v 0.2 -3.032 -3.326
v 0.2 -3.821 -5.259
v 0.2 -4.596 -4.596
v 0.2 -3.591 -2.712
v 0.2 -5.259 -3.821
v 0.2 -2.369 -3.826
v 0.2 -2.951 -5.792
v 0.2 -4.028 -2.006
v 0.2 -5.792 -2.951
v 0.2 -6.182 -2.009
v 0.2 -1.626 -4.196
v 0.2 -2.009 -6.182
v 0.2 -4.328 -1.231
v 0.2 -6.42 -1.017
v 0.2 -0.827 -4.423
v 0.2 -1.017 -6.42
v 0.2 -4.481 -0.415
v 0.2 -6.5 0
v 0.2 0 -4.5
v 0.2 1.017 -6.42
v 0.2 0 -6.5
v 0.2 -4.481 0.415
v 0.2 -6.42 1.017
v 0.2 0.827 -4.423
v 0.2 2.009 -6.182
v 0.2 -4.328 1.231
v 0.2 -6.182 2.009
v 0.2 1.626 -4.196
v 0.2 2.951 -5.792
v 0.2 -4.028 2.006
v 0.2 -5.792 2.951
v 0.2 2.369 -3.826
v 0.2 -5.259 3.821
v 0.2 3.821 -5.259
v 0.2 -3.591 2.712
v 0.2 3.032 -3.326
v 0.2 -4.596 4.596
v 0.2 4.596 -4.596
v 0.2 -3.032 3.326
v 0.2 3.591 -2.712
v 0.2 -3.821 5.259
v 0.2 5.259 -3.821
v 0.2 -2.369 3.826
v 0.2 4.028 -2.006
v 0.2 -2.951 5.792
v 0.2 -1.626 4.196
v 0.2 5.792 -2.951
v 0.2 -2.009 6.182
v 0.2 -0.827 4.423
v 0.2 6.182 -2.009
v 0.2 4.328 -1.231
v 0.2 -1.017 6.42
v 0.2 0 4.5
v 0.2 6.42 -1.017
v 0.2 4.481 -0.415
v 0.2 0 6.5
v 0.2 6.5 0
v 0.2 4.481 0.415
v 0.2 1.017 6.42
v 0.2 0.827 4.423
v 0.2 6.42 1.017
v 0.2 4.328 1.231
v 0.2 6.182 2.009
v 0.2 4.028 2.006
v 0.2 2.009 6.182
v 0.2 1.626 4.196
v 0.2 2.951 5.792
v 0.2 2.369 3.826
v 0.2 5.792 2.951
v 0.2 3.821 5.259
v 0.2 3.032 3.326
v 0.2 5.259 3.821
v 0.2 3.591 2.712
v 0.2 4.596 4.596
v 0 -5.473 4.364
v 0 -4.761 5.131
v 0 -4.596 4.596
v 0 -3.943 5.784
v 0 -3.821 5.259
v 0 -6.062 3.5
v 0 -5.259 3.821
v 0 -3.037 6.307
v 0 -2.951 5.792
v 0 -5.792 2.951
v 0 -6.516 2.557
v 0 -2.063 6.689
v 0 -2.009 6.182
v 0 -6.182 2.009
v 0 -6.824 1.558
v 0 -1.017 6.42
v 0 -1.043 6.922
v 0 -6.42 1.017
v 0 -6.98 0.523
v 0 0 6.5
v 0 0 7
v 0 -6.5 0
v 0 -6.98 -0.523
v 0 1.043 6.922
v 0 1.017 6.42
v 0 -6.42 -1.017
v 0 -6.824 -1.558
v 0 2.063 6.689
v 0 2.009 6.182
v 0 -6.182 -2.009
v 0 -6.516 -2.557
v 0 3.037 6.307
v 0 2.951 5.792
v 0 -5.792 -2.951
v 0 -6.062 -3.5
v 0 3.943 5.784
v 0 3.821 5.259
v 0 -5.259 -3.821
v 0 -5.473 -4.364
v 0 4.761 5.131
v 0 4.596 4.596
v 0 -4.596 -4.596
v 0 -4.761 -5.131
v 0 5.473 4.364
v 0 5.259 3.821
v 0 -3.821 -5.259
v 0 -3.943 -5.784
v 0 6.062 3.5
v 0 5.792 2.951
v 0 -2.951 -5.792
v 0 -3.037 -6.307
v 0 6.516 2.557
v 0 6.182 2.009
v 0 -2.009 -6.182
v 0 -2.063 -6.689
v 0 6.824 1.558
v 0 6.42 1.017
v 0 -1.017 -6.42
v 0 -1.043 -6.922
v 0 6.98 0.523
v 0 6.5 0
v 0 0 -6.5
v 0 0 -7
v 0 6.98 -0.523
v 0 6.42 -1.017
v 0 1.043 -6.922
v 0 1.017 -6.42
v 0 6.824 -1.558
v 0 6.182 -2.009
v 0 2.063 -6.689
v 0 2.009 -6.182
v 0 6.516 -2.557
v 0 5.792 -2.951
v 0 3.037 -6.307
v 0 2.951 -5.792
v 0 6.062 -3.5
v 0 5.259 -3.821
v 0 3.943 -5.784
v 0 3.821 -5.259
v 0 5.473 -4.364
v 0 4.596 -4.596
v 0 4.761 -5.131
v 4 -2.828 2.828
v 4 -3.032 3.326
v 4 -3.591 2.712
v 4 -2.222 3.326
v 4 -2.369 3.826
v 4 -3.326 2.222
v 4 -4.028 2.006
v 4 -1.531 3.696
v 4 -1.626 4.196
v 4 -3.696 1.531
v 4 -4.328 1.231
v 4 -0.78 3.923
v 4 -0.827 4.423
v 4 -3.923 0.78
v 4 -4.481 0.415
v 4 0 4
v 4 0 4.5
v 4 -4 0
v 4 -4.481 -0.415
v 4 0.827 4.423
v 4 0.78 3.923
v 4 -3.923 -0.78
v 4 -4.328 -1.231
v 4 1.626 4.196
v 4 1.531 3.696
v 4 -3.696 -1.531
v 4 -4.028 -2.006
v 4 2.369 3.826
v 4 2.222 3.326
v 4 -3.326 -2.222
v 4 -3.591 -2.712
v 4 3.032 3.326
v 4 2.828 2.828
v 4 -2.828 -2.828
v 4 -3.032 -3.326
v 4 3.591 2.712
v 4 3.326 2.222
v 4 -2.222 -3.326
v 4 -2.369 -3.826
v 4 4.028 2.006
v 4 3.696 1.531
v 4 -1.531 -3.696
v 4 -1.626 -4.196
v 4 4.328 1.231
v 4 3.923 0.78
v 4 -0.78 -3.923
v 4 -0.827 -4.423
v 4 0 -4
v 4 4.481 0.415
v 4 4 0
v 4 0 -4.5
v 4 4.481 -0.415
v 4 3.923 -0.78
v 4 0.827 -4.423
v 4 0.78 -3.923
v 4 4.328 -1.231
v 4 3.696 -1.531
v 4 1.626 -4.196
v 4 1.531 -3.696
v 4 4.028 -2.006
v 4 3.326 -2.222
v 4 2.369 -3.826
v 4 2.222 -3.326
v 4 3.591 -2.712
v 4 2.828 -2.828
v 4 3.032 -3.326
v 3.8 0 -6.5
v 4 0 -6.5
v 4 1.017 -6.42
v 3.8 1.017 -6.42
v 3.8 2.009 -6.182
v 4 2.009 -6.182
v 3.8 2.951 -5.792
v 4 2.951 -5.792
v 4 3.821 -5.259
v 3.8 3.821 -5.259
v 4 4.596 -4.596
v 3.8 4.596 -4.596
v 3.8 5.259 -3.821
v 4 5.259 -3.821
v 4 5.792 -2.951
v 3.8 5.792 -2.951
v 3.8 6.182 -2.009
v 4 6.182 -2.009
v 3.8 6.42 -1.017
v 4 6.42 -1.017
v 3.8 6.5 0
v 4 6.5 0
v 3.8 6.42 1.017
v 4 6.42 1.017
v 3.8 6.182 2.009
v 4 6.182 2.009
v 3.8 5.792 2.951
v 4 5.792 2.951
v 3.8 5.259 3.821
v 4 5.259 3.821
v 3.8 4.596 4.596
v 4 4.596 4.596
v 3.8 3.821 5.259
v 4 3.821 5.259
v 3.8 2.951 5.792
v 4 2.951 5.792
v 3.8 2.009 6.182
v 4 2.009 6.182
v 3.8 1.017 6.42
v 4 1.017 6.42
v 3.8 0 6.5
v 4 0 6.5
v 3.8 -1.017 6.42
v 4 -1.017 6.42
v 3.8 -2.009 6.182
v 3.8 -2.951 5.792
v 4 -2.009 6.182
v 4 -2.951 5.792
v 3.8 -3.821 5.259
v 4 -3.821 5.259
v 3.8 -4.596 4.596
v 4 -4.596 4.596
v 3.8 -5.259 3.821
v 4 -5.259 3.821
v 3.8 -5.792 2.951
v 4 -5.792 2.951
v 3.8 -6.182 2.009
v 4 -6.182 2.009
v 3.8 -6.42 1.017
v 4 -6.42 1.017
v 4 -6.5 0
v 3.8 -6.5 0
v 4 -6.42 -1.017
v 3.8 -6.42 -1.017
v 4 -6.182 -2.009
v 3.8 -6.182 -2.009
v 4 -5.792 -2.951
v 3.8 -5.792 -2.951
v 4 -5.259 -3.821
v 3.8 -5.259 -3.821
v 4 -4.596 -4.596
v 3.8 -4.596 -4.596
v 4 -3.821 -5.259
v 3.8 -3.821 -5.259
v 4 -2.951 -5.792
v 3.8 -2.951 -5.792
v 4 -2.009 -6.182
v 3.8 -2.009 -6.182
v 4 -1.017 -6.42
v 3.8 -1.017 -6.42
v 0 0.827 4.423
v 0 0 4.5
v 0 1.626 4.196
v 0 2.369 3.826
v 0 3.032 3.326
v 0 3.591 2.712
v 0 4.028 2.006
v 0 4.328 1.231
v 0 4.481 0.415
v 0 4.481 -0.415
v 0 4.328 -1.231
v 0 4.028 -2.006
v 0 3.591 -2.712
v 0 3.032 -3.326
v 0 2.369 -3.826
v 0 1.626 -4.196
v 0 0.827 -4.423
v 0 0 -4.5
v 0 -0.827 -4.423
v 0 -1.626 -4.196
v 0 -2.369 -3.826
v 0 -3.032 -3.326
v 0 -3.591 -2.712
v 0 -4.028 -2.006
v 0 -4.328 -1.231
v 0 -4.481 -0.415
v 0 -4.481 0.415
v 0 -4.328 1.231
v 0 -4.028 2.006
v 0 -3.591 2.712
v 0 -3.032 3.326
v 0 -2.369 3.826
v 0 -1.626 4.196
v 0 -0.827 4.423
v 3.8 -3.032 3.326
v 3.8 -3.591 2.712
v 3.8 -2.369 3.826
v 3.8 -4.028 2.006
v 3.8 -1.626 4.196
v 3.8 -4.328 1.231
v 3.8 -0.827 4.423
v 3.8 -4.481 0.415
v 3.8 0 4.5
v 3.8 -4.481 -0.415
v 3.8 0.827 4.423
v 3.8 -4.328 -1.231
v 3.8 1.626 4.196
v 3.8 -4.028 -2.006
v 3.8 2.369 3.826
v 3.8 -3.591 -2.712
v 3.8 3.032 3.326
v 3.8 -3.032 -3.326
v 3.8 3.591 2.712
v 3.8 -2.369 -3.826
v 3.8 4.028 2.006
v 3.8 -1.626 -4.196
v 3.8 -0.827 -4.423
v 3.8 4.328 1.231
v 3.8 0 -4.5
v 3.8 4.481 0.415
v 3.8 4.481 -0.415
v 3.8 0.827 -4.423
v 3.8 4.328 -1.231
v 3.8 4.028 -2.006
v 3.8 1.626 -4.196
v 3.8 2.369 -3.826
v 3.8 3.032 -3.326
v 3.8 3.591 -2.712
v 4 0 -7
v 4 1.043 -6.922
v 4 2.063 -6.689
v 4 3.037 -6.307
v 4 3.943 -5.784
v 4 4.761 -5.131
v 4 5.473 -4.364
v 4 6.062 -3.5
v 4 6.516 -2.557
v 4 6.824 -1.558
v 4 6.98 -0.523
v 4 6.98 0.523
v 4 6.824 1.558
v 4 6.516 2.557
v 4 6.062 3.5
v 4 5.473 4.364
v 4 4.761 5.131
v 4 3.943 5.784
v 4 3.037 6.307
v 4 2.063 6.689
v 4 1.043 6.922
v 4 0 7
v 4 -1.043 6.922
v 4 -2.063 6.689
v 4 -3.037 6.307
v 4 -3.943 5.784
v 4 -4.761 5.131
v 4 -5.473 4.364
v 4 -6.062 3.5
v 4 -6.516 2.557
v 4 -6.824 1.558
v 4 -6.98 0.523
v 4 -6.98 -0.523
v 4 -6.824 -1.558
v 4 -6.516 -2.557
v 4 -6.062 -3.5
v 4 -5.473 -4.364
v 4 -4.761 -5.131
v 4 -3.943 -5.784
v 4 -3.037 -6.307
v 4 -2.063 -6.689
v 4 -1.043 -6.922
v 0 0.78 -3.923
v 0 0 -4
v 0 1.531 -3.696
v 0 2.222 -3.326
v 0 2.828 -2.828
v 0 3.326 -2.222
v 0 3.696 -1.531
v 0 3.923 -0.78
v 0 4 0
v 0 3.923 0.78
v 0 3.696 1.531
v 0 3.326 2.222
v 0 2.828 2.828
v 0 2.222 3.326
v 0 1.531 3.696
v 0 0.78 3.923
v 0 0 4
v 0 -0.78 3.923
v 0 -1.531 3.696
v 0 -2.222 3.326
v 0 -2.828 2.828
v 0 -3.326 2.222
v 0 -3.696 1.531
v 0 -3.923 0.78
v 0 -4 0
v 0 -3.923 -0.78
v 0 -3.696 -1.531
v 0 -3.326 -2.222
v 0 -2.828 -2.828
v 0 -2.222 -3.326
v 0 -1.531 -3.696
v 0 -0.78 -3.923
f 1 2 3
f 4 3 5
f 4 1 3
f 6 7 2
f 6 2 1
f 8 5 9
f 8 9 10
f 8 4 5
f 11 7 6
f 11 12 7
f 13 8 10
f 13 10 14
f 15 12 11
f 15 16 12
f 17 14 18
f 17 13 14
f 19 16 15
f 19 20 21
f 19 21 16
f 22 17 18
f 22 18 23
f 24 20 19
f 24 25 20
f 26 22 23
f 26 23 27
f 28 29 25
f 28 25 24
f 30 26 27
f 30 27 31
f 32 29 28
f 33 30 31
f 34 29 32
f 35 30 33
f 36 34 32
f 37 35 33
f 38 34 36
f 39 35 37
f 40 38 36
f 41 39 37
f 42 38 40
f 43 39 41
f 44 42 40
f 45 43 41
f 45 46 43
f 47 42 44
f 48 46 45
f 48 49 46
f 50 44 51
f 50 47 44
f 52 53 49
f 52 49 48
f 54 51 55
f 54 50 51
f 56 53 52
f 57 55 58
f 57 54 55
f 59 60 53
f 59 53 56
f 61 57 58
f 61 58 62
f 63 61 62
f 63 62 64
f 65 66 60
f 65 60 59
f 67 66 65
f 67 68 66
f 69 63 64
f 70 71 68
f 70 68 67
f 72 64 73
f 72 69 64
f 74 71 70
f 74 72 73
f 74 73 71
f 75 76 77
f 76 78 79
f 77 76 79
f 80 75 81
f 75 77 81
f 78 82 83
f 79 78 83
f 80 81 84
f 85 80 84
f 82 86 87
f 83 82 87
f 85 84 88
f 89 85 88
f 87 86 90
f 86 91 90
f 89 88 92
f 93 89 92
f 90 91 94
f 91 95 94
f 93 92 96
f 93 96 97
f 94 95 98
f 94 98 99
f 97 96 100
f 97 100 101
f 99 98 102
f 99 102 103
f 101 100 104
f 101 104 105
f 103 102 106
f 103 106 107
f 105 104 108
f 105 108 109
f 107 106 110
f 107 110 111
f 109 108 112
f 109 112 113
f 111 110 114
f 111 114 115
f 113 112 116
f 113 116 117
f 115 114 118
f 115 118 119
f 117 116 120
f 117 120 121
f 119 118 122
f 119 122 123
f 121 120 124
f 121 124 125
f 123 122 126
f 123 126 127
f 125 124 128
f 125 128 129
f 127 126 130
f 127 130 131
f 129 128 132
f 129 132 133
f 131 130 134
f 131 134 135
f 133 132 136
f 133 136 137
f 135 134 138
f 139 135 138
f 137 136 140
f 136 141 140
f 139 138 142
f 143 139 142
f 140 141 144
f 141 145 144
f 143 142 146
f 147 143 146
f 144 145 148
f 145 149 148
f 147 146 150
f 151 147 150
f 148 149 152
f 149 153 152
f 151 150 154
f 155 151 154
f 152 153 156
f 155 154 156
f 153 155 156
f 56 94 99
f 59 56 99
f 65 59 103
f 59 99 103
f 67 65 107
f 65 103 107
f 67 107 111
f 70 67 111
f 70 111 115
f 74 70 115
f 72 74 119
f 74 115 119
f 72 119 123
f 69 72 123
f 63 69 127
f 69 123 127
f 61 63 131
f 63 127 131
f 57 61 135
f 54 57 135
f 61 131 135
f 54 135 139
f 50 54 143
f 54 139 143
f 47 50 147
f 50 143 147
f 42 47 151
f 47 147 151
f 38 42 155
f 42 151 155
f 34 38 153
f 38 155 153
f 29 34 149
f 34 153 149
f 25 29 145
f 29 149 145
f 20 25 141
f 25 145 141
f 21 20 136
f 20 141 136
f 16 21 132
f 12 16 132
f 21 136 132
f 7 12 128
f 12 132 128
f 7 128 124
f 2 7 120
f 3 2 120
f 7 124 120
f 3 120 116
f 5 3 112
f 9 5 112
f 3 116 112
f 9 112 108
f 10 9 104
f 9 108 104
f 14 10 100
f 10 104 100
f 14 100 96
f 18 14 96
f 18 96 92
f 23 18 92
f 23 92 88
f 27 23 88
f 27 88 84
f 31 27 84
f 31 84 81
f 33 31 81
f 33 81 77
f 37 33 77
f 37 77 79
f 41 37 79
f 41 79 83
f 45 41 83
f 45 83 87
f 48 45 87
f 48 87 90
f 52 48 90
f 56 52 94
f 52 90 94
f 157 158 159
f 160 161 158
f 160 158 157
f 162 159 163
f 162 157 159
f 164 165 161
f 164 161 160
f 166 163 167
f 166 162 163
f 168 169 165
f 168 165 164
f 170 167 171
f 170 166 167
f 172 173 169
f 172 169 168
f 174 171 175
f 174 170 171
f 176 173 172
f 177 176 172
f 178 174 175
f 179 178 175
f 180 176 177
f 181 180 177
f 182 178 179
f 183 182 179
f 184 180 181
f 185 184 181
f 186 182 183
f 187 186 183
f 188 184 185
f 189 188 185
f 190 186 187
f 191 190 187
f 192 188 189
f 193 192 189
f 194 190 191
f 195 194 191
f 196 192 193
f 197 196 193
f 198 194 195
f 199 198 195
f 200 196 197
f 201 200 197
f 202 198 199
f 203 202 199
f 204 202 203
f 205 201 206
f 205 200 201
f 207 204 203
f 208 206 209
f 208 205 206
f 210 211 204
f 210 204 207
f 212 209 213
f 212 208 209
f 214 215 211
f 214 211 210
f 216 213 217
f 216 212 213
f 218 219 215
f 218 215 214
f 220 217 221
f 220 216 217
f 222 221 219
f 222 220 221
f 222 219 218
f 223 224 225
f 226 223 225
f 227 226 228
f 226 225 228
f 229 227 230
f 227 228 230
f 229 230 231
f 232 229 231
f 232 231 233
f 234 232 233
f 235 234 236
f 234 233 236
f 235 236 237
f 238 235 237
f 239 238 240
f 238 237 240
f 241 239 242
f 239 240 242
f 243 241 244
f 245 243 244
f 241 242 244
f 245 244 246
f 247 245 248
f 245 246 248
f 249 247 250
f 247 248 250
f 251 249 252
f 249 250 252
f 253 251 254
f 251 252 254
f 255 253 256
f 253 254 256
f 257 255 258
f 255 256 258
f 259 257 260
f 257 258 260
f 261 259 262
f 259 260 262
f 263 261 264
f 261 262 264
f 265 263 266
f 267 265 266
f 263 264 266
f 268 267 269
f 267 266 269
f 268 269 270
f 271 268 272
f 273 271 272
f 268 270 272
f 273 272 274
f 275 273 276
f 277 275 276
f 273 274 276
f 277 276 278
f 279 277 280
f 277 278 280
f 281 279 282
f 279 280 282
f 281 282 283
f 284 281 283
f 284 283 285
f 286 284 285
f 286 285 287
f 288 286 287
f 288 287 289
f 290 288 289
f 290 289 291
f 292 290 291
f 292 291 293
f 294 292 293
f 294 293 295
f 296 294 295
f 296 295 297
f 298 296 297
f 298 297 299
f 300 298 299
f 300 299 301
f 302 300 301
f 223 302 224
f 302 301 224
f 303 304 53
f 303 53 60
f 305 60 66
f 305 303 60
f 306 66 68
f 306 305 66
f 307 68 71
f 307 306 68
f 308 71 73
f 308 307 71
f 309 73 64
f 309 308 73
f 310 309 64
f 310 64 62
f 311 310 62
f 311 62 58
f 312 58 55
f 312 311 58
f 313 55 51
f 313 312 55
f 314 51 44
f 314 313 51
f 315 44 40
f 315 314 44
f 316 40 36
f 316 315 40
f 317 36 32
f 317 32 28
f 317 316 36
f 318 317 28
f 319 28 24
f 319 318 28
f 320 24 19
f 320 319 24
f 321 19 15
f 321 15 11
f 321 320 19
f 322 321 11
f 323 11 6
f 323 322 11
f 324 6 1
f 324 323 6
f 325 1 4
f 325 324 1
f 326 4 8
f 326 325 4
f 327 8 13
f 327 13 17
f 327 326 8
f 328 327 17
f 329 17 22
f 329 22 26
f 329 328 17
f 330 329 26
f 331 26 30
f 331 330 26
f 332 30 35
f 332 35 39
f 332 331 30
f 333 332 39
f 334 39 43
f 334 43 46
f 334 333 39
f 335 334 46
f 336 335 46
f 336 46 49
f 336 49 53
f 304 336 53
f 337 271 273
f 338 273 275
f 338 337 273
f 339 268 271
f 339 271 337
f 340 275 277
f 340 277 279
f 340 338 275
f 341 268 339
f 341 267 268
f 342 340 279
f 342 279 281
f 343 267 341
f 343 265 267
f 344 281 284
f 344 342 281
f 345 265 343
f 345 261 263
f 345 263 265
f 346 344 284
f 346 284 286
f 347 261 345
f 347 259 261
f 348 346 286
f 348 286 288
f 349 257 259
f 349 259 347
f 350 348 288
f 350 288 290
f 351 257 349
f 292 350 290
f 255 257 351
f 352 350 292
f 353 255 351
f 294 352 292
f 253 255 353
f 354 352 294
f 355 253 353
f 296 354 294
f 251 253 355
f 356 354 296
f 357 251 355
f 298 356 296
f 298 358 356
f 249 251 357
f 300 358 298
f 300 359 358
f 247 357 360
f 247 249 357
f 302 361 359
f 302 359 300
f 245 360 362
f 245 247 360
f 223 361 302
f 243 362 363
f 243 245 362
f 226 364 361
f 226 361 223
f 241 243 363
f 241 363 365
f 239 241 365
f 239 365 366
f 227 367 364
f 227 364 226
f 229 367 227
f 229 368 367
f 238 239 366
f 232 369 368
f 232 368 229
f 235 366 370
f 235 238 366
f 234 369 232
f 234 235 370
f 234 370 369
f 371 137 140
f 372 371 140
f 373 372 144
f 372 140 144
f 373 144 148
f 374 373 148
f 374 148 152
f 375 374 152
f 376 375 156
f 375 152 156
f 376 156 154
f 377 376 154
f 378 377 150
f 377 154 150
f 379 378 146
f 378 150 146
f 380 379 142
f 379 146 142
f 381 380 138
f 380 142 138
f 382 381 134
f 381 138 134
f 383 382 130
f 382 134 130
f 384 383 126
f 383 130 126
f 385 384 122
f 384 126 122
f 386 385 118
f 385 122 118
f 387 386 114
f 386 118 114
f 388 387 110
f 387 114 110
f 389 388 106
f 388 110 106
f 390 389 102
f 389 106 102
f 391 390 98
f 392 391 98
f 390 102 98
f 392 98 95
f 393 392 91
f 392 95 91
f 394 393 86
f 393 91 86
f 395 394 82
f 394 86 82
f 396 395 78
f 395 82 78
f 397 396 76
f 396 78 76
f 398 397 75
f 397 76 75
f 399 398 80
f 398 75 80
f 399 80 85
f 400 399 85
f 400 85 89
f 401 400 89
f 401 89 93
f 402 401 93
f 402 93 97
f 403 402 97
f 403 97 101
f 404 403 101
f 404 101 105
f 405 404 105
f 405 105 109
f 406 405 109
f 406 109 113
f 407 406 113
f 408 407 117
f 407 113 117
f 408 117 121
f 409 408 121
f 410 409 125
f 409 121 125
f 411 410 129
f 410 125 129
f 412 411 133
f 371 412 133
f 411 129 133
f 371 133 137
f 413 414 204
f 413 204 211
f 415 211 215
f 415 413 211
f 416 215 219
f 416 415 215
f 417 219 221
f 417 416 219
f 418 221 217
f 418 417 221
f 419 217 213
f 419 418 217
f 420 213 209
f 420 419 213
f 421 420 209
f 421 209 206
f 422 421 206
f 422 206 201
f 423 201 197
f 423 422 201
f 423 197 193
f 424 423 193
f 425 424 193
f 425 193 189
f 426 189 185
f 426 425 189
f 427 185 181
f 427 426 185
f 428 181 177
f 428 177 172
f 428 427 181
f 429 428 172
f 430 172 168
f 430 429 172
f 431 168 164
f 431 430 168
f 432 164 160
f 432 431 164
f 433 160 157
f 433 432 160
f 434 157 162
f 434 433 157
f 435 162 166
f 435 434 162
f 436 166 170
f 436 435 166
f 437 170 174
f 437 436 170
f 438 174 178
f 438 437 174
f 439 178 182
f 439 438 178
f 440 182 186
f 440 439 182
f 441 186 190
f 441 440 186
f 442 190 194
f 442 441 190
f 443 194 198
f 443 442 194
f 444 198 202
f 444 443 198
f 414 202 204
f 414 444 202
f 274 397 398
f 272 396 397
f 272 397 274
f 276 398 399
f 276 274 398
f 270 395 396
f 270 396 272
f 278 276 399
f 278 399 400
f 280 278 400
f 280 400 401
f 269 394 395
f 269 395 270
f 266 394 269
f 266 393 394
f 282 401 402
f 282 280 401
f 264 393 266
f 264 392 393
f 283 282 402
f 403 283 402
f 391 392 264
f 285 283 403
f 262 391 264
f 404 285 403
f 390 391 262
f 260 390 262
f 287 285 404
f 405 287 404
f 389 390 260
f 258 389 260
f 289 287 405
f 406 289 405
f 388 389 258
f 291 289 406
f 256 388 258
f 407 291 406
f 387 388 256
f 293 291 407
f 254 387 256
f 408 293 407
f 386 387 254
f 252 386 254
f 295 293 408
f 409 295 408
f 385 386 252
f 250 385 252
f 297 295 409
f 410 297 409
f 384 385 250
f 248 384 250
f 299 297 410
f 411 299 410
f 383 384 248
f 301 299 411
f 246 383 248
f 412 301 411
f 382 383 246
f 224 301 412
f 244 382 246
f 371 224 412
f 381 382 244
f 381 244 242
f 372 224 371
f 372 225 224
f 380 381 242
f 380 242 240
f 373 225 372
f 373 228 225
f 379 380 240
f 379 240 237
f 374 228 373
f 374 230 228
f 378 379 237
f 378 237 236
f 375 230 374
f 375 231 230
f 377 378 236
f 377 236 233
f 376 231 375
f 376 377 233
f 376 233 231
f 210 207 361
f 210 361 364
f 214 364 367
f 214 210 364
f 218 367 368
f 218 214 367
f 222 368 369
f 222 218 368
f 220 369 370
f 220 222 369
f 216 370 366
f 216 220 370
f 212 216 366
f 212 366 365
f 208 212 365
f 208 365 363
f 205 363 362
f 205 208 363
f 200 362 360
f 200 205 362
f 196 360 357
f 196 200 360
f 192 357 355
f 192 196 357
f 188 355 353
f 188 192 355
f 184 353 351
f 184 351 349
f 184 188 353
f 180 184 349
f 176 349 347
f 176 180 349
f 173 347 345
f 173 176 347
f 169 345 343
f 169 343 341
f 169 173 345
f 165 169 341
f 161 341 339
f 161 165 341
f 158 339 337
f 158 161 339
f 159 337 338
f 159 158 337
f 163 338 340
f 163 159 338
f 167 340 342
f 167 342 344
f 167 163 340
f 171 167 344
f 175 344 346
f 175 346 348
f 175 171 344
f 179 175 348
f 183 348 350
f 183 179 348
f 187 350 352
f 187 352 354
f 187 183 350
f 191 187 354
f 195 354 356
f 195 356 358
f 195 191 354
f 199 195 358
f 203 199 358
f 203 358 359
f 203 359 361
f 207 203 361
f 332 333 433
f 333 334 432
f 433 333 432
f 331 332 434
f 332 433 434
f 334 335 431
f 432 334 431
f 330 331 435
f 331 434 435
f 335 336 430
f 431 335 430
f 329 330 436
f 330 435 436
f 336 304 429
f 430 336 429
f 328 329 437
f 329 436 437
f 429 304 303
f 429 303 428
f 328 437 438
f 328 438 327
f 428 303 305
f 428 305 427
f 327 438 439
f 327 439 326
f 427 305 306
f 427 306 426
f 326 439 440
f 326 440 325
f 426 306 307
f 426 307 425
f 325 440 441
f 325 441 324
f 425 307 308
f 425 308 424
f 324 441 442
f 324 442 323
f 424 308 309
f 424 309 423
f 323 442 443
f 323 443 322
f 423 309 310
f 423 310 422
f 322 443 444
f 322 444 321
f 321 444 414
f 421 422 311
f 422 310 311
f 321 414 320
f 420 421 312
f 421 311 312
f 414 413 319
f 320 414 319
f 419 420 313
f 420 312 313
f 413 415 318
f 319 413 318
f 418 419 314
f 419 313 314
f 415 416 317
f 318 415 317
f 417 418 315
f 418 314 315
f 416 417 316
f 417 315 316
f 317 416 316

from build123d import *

# Parameters (mm, degrees)
SKETCH_1_R          = 7
SKETCH_1_R_2        = 4
EXTRUDE_1_DEPTH     = 4
SKETCH_2_R          = 6.5
SKETCH_2_R_2        = 4.5
CUT_EXTRUDE_1_DEPTH = 0.2
SKETCH_3_R          = 6.5
SKETCH_3_R_2        = 4.5
CUT_EXTRUDE_2_DEPTH = 0.2


with BuildPart() as part:
    # 草图1 → 凸台-拉伸1 (new body)
    with BuildSketch(Plane(origin=(0, 0, 0), x_dir=(0, 0, -1), z_dir=(1, 0, 0))):
        Circle(SKETCH_1_R)
        Circle(SKETCH_1_R_2, mode=Mode.SUBTRACT)
    extrude(amount=EXTRUDE_1_DEPTH)

    # 草图2 → 切除-拉伸1 (cut)
    with BuildSketch(Plane(origin=(4, 0, 0), x_dir=(0, 0, -1), z_dir=(1, 0, 0))):
        Circle(SKETCH_2_R)
        Circle(SKETCH_2_R_2, mode=Mode.SUBTRACT)
    extrude(amount=-CUT_EXTRUDE_1_DEPTH, mode=Mode.SUBTRACT)

    # 草图3 → 切除-拉伸2 (cut)
    with BuildSketch(Plane.ZY):
        Circle(SKETCH_3_R)
        Circle(SKETCH_3_R_2, mode=Mode.SUBTRACT)
    extrude(amount=-CUT_EXTRUDE_2_DEPTH, mode=Mode.SUBTRACT)


solid = part.part
